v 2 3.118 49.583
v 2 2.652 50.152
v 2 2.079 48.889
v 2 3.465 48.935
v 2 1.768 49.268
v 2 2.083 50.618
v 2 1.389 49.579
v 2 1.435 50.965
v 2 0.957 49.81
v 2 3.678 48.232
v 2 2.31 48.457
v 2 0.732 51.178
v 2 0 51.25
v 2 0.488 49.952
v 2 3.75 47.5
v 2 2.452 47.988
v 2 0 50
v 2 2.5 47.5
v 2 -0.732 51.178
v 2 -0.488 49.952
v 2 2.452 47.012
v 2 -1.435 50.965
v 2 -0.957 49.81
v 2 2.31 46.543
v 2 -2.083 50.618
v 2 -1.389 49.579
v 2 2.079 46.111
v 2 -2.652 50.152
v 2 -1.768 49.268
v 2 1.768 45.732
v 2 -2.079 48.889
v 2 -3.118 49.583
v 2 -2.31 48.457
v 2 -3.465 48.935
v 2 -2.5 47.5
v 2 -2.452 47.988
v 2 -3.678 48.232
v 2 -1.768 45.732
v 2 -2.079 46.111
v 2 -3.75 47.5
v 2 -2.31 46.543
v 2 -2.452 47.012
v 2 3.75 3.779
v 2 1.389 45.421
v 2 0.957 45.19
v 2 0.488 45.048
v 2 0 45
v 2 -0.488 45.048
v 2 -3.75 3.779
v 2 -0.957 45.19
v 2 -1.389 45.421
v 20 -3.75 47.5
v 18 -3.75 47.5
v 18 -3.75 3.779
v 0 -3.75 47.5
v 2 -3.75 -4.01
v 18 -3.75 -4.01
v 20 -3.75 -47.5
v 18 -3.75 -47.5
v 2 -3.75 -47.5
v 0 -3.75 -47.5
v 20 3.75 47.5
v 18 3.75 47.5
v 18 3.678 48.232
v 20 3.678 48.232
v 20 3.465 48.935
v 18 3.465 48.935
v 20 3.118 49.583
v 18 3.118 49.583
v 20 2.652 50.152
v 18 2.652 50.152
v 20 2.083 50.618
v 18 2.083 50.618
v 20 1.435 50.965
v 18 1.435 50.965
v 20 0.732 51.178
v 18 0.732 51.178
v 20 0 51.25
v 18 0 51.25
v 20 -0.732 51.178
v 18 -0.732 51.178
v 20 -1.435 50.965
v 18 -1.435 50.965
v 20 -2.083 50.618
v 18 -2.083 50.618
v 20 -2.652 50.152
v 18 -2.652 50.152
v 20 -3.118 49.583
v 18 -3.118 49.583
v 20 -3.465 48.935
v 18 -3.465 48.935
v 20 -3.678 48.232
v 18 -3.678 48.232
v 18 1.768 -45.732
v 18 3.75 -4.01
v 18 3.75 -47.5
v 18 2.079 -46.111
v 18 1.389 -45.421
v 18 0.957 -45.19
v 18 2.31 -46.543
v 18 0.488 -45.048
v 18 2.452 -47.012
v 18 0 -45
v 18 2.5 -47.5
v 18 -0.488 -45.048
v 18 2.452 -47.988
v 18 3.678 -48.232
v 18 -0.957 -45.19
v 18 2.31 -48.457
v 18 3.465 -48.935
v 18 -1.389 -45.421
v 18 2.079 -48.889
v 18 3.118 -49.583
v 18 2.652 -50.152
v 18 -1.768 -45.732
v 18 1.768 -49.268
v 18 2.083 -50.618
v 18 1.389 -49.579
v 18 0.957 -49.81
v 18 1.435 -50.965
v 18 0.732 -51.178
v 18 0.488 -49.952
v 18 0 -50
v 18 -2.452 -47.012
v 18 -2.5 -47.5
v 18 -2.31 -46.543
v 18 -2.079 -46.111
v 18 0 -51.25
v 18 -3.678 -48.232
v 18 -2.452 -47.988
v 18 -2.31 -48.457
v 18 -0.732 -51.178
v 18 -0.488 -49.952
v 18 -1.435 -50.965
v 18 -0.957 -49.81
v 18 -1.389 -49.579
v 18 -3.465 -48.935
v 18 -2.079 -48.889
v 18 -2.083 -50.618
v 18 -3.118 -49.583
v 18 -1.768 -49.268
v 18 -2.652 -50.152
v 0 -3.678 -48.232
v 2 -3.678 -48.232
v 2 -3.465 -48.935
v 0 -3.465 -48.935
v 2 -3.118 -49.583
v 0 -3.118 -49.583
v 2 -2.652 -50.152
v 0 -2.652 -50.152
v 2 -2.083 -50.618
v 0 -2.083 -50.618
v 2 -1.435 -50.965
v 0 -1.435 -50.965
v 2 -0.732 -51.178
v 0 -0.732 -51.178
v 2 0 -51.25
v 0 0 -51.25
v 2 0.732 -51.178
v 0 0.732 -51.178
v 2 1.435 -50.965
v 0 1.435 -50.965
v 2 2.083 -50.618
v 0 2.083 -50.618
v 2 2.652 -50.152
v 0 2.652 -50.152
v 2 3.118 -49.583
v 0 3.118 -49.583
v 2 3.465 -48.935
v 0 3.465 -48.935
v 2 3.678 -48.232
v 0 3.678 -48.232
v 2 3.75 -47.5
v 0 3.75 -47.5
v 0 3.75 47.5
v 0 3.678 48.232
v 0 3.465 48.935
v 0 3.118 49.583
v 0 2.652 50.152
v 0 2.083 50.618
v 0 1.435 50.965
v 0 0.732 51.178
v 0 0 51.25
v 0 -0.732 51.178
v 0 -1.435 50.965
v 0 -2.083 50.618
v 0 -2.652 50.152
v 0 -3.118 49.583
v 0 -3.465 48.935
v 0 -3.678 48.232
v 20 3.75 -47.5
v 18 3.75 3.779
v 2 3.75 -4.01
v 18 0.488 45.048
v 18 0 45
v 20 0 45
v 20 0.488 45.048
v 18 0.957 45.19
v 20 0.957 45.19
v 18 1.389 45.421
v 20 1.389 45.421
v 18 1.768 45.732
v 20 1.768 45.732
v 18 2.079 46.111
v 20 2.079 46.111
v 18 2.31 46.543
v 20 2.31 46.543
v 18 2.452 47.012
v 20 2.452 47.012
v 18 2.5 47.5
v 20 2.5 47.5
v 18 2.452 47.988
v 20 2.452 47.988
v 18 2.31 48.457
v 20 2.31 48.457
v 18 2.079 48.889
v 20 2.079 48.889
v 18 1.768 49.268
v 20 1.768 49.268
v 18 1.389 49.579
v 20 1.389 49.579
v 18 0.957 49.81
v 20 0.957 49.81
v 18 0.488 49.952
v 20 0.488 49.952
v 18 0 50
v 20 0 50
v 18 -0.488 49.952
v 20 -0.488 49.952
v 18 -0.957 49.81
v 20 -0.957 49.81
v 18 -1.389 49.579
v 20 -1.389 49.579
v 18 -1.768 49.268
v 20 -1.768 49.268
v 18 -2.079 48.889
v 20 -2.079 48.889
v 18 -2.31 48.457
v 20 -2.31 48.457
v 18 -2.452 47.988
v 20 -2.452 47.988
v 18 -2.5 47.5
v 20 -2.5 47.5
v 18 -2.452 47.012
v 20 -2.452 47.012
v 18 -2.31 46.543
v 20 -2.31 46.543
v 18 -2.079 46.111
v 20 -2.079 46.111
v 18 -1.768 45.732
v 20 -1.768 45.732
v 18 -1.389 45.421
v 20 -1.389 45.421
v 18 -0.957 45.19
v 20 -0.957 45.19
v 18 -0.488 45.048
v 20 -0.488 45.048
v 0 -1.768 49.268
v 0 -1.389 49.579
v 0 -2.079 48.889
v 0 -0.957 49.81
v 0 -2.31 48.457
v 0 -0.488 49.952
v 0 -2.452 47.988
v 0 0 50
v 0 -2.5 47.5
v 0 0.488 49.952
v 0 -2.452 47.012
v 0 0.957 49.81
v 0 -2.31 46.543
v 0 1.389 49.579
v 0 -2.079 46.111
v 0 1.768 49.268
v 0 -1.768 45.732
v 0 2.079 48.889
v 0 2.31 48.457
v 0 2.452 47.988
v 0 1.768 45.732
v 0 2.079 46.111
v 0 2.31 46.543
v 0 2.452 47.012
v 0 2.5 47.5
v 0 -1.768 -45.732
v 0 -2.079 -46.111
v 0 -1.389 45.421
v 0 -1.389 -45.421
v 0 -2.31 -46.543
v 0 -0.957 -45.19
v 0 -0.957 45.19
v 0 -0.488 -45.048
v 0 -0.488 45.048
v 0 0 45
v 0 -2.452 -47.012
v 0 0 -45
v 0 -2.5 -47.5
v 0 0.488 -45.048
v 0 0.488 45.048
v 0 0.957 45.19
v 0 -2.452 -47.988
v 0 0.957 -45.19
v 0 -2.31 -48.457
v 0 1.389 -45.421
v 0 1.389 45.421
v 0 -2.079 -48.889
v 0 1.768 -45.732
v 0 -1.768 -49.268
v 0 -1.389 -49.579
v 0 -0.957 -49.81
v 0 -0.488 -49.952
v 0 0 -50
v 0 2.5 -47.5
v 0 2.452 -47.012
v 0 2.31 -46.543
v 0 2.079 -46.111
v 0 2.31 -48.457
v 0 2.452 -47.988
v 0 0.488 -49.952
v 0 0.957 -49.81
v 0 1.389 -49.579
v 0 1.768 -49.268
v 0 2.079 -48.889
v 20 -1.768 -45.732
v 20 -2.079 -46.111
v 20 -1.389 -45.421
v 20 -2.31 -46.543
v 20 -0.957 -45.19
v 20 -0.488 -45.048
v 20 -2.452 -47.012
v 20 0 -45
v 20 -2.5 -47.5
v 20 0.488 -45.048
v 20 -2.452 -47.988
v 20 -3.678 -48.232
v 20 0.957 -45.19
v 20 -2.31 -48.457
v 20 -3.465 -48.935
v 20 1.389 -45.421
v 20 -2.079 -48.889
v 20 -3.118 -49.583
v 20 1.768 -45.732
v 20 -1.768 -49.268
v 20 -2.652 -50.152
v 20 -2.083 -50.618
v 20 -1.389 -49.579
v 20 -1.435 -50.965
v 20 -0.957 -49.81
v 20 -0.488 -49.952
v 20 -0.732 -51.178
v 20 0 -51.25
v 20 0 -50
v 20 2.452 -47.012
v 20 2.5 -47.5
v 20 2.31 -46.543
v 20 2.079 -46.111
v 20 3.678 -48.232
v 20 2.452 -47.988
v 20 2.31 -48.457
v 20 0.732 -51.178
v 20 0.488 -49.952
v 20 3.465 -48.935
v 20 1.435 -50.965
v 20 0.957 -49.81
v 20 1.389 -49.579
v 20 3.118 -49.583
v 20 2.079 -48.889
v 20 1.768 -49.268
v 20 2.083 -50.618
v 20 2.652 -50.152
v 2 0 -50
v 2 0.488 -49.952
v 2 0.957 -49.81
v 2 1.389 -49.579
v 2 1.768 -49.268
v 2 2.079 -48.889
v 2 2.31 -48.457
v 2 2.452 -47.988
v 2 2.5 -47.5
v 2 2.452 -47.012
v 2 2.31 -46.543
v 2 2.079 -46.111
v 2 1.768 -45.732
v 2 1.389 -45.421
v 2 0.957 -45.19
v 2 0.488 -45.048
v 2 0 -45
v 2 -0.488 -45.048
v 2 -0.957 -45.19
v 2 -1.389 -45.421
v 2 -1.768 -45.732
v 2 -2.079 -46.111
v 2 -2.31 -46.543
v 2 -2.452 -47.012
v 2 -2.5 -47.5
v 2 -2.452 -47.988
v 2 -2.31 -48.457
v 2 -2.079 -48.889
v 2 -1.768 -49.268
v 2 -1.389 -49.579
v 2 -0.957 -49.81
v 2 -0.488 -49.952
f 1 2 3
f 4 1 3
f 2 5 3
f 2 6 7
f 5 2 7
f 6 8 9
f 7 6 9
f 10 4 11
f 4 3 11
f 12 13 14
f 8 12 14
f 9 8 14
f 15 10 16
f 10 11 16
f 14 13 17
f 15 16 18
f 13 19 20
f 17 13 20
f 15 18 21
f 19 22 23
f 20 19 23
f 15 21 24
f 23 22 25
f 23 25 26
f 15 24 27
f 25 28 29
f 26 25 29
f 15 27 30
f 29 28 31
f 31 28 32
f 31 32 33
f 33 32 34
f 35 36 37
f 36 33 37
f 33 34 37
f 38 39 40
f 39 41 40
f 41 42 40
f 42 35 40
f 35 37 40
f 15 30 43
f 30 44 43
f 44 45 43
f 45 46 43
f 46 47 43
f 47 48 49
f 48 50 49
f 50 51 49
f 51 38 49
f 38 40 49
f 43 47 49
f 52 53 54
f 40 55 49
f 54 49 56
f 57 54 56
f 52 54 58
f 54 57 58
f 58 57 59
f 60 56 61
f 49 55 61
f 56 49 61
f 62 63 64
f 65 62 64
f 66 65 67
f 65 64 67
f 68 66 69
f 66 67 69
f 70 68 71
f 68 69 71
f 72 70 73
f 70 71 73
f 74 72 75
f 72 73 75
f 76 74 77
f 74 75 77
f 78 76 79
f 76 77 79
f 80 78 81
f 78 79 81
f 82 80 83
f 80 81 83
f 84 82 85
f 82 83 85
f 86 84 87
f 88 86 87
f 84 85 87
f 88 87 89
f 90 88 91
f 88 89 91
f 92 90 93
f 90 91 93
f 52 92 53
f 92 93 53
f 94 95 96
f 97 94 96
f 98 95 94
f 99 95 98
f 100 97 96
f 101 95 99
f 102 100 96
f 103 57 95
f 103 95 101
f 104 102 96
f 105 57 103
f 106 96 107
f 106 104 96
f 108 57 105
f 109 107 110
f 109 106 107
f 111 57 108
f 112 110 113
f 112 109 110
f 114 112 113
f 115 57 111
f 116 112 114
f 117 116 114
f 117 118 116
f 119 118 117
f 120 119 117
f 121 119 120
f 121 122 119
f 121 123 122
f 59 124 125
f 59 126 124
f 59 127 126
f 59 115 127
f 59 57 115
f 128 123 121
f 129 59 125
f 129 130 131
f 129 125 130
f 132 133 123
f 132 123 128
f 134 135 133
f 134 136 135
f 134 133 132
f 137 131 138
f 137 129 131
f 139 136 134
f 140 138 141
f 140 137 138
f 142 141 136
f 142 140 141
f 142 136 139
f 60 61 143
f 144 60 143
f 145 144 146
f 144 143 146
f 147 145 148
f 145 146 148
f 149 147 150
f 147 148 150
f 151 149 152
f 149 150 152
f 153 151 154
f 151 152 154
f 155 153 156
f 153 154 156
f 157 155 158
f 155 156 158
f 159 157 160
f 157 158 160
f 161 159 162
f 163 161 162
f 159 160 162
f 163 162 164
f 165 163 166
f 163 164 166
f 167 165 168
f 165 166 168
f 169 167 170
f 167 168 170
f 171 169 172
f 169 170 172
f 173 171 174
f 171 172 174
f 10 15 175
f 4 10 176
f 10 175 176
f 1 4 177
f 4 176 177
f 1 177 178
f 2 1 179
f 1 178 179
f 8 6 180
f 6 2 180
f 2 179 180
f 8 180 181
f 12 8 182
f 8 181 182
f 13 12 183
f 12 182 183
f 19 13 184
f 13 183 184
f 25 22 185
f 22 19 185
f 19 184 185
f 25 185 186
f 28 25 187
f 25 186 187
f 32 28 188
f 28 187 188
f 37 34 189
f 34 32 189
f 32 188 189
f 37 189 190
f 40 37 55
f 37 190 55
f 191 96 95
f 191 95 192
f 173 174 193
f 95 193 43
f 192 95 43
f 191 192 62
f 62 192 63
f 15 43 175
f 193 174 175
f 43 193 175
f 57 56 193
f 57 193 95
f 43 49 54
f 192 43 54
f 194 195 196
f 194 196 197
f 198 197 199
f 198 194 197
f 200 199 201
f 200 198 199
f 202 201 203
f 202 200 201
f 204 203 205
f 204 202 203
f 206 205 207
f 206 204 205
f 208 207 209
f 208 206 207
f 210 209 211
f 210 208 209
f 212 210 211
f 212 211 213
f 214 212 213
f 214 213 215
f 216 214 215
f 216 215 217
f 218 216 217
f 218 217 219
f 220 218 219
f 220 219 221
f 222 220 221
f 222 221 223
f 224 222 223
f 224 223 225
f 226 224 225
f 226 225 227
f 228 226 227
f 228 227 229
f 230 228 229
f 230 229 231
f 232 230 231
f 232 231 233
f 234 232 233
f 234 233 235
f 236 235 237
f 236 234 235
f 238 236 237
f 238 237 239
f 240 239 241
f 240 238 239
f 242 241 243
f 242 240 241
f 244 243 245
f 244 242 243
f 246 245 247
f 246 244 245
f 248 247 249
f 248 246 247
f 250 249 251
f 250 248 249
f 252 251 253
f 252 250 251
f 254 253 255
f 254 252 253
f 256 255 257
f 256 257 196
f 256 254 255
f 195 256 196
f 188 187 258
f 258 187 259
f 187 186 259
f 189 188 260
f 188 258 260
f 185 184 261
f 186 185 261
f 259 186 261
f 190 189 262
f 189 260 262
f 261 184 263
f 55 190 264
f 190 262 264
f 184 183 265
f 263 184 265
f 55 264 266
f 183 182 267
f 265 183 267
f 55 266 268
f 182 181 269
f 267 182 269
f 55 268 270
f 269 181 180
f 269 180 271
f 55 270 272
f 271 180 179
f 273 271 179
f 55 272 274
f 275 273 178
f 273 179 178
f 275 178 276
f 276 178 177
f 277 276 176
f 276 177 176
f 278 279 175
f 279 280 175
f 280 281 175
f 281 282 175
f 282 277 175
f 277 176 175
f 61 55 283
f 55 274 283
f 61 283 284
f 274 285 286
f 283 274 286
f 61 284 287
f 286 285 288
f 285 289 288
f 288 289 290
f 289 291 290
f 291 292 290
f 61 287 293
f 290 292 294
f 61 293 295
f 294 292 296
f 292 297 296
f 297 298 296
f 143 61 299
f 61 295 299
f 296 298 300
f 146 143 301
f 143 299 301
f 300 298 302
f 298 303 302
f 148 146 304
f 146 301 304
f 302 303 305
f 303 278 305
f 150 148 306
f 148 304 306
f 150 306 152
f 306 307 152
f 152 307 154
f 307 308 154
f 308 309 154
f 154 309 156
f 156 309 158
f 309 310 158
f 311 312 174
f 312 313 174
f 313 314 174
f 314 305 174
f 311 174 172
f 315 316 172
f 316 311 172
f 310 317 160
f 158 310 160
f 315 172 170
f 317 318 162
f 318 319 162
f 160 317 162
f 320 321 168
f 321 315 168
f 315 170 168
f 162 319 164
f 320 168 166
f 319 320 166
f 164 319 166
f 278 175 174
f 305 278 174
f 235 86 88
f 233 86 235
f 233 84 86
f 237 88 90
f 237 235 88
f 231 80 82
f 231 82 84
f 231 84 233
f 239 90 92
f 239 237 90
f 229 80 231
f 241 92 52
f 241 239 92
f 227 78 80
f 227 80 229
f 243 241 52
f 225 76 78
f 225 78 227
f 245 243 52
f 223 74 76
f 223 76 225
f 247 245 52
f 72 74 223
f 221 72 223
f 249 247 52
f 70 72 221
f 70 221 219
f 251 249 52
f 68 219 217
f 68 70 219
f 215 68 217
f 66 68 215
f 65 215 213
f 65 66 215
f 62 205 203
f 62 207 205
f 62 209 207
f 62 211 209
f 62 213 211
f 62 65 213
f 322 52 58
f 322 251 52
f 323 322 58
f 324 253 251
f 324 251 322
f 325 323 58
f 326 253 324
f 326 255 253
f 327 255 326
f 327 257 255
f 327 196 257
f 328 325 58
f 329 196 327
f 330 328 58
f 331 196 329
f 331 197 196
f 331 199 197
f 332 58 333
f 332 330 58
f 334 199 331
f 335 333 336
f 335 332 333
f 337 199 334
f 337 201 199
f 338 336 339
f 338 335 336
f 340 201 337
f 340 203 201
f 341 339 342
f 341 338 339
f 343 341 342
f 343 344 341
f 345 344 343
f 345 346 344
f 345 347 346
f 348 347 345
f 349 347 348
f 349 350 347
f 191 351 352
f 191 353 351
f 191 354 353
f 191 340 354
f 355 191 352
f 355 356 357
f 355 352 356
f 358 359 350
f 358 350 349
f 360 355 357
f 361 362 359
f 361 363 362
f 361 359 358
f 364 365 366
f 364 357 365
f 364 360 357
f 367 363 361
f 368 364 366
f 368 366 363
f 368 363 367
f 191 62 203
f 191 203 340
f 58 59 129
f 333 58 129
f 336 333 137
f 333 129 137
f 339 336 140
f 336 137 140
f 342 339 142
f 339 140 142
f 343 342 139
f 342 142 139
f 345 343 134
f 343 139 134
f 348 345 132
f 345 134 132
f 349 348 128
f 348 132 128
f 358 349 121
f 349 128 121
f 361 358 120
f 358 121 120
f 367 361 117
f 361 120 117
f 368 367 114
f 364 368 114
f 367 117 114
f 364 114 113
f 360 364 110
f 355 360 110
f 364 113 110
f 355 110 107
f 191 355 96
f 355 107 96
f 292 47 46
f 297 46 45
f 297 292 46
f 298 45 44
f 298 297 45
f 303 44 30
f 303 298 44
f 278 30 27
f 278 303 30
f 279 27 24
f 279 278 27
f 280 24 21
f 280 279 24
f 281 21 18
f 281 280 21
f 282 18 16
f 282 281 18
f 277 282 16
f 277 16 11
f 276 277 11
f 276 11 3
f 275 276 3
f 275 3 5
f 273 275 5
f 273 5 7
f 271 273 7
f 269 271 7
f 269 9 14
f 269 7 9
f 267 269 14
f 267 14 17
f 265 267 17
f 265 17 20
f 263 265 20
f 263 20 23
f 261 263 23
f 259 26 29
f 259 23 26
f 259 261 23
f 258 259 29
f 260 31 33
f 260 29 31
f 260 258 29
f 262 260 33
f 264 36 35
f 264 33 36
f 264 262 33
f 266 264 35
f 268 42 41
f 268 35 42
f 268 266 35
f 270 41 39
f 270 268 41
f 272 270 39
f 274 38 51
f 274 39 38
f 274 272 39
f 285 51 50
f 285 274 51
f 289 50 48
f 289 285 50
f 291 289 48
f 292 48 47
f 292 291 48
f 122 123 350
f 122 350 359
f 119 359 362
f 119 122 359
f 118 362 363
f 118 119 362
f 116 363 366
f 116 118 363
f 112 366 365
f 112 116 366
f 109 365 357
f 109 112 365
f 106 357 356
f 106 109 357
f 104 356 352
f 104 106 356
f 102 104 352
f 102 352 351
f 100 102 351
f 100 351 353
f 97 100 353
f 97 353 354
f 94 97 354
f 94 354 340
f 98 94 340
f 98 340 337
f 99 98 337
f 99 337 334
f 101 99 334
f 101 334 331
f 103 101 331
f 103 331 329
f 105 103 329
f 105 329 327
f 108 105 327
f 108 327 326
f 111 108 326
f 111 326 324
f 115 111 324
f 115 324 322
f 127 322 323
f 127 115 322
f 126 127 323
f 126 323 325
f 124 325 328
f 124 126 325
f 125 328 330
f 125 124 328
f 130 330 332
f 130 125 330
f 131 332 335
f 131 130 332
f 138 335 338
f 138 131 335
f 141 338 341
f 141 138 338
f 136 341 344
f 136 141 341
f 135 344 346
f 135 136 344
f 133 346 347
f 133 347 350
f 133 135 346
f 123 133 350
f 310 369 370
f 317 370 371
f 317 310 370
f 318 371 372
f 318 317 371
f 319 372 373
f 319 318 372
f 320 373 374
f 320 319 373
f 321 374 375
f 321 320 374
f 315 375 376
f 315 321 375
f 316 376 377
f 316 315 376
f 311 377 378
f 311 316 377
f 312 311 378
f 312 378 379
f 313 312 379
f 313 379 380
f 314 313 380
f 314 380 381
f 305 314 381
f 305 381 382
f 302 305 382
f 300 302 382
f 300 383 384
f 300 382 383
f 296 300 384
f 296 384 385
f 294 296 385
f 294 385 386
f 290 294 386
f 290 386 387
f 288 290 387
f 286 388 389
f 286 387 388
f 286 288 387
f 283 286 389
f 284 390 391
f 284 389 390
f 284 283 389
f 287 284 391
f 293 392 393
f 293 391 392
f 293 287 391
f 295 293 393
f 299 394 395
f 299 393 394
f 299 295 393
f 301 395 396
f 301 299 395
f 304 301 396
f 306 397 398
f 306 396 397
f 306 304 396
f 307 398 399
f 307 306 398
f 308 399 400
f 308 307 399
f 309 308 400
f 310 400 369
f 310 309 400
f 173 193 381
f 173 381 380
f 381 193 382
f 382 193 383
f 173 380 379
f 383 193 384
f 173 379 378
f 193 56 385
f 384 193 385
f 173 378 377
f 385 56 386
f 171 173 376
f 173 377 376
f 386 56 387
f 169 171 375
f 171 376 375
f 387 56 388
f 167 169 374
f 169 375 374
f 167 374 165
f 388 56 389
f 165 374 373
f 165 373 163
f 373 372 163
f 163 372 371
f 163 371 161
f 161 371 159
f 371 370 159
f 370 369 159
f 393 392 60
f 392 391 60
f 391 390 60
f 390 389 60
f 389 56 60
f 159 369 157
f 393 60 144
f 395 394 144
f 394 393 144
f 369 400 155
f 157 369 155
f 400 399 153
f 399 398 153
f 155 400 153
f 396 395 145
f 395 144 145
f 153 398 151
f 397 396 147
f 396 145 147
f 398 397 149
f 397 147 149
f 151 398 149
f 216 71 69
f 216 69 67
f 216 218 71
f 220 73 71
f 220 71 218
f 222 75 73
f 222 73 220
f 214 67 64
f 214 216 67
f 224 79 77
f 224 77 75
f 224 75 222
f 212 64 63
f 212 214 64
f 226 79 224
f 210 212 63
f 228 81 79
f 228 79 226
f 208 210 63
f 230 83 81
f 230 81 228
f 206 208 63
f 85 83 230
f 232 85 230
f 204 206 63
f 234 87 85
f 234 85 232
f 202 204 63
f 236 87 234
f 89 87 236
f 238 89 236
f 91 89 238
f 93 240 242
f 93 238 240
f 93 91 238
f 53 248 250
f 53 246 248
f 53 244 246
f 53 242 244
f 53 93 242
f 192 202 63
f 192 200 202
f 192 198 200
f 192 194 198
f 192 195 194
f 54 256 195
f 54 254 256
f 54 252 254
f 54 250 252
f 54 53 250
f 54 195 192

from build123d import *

# Parameters (mm, degrees)
SKETCH1_R               = 2.5
BOSS_EXTRUDE1_DEPTH     = 20
CUT_EXTRUDE1_DEPTH      = 56.523080786
CUT_EXTRUDE1_DEPTH_BACK = 56.523080786
SKETCH2_W               = 16
SKETCH2_H               = 47.239813723
SKETCH2_H_2             = 47.470835296


with BuildPart() as part:
    # Sketch1 → Boss-Extrude1 (new body)
    with BuildSketch(Plane(origin=(0, 0, 0), x_dir=(0, 0, -1), z_dir=(1, 0, 0))):
        with BuildLine():
            Line((47.5, 3.75), (-47.5, 3.75))
            ThreePointArc((-47.5, 3.75), (-51.25, 0), (-47.5, -3.75))
            Line((-47.5, -3.75), (47.5, -3.75))
            ThreePointArc((47.5, -3.75), (51.25, 0), (47.5, 3.75))
        make_face()
        with Locations((-47.5, 0)):
            Circle(SKETCH1_R, mode=Mode.SUBTRACT)
        with Locations((47.5, 0)):
            Circle(SKETCH1_R, mode=Mode.SUBTRACT)
    extrude(amount=BOSS_EXTRUDE1_DEPTH)

    # Sketch2 → Cut-Extrude1 (cut, two sides: drawn at the far end of the back side and taken through both)
    with BuildSketch(Plane(origin=(0, 3.75, 0), x_dir=(1, 0, 0), z_dir=(0, 1, 0)).offset(-CUT_EXTRUDE1_DEPTH_BACK)):
        with Locations((10, 27.630093139)):
            Rectangle(SKETCH2_W, SKETCH2_H)
        with Locations((10, -27.514582352)):
            Rectangle(SKETCH2_W, SKETCH2_H_2)
    extrude(amount=CUT_EXTRUDE1_DEPTH + CUT_EXTRUDE1_DEPTH_BACK, mode=Mode.SUBTRACT)


solid = part.part
